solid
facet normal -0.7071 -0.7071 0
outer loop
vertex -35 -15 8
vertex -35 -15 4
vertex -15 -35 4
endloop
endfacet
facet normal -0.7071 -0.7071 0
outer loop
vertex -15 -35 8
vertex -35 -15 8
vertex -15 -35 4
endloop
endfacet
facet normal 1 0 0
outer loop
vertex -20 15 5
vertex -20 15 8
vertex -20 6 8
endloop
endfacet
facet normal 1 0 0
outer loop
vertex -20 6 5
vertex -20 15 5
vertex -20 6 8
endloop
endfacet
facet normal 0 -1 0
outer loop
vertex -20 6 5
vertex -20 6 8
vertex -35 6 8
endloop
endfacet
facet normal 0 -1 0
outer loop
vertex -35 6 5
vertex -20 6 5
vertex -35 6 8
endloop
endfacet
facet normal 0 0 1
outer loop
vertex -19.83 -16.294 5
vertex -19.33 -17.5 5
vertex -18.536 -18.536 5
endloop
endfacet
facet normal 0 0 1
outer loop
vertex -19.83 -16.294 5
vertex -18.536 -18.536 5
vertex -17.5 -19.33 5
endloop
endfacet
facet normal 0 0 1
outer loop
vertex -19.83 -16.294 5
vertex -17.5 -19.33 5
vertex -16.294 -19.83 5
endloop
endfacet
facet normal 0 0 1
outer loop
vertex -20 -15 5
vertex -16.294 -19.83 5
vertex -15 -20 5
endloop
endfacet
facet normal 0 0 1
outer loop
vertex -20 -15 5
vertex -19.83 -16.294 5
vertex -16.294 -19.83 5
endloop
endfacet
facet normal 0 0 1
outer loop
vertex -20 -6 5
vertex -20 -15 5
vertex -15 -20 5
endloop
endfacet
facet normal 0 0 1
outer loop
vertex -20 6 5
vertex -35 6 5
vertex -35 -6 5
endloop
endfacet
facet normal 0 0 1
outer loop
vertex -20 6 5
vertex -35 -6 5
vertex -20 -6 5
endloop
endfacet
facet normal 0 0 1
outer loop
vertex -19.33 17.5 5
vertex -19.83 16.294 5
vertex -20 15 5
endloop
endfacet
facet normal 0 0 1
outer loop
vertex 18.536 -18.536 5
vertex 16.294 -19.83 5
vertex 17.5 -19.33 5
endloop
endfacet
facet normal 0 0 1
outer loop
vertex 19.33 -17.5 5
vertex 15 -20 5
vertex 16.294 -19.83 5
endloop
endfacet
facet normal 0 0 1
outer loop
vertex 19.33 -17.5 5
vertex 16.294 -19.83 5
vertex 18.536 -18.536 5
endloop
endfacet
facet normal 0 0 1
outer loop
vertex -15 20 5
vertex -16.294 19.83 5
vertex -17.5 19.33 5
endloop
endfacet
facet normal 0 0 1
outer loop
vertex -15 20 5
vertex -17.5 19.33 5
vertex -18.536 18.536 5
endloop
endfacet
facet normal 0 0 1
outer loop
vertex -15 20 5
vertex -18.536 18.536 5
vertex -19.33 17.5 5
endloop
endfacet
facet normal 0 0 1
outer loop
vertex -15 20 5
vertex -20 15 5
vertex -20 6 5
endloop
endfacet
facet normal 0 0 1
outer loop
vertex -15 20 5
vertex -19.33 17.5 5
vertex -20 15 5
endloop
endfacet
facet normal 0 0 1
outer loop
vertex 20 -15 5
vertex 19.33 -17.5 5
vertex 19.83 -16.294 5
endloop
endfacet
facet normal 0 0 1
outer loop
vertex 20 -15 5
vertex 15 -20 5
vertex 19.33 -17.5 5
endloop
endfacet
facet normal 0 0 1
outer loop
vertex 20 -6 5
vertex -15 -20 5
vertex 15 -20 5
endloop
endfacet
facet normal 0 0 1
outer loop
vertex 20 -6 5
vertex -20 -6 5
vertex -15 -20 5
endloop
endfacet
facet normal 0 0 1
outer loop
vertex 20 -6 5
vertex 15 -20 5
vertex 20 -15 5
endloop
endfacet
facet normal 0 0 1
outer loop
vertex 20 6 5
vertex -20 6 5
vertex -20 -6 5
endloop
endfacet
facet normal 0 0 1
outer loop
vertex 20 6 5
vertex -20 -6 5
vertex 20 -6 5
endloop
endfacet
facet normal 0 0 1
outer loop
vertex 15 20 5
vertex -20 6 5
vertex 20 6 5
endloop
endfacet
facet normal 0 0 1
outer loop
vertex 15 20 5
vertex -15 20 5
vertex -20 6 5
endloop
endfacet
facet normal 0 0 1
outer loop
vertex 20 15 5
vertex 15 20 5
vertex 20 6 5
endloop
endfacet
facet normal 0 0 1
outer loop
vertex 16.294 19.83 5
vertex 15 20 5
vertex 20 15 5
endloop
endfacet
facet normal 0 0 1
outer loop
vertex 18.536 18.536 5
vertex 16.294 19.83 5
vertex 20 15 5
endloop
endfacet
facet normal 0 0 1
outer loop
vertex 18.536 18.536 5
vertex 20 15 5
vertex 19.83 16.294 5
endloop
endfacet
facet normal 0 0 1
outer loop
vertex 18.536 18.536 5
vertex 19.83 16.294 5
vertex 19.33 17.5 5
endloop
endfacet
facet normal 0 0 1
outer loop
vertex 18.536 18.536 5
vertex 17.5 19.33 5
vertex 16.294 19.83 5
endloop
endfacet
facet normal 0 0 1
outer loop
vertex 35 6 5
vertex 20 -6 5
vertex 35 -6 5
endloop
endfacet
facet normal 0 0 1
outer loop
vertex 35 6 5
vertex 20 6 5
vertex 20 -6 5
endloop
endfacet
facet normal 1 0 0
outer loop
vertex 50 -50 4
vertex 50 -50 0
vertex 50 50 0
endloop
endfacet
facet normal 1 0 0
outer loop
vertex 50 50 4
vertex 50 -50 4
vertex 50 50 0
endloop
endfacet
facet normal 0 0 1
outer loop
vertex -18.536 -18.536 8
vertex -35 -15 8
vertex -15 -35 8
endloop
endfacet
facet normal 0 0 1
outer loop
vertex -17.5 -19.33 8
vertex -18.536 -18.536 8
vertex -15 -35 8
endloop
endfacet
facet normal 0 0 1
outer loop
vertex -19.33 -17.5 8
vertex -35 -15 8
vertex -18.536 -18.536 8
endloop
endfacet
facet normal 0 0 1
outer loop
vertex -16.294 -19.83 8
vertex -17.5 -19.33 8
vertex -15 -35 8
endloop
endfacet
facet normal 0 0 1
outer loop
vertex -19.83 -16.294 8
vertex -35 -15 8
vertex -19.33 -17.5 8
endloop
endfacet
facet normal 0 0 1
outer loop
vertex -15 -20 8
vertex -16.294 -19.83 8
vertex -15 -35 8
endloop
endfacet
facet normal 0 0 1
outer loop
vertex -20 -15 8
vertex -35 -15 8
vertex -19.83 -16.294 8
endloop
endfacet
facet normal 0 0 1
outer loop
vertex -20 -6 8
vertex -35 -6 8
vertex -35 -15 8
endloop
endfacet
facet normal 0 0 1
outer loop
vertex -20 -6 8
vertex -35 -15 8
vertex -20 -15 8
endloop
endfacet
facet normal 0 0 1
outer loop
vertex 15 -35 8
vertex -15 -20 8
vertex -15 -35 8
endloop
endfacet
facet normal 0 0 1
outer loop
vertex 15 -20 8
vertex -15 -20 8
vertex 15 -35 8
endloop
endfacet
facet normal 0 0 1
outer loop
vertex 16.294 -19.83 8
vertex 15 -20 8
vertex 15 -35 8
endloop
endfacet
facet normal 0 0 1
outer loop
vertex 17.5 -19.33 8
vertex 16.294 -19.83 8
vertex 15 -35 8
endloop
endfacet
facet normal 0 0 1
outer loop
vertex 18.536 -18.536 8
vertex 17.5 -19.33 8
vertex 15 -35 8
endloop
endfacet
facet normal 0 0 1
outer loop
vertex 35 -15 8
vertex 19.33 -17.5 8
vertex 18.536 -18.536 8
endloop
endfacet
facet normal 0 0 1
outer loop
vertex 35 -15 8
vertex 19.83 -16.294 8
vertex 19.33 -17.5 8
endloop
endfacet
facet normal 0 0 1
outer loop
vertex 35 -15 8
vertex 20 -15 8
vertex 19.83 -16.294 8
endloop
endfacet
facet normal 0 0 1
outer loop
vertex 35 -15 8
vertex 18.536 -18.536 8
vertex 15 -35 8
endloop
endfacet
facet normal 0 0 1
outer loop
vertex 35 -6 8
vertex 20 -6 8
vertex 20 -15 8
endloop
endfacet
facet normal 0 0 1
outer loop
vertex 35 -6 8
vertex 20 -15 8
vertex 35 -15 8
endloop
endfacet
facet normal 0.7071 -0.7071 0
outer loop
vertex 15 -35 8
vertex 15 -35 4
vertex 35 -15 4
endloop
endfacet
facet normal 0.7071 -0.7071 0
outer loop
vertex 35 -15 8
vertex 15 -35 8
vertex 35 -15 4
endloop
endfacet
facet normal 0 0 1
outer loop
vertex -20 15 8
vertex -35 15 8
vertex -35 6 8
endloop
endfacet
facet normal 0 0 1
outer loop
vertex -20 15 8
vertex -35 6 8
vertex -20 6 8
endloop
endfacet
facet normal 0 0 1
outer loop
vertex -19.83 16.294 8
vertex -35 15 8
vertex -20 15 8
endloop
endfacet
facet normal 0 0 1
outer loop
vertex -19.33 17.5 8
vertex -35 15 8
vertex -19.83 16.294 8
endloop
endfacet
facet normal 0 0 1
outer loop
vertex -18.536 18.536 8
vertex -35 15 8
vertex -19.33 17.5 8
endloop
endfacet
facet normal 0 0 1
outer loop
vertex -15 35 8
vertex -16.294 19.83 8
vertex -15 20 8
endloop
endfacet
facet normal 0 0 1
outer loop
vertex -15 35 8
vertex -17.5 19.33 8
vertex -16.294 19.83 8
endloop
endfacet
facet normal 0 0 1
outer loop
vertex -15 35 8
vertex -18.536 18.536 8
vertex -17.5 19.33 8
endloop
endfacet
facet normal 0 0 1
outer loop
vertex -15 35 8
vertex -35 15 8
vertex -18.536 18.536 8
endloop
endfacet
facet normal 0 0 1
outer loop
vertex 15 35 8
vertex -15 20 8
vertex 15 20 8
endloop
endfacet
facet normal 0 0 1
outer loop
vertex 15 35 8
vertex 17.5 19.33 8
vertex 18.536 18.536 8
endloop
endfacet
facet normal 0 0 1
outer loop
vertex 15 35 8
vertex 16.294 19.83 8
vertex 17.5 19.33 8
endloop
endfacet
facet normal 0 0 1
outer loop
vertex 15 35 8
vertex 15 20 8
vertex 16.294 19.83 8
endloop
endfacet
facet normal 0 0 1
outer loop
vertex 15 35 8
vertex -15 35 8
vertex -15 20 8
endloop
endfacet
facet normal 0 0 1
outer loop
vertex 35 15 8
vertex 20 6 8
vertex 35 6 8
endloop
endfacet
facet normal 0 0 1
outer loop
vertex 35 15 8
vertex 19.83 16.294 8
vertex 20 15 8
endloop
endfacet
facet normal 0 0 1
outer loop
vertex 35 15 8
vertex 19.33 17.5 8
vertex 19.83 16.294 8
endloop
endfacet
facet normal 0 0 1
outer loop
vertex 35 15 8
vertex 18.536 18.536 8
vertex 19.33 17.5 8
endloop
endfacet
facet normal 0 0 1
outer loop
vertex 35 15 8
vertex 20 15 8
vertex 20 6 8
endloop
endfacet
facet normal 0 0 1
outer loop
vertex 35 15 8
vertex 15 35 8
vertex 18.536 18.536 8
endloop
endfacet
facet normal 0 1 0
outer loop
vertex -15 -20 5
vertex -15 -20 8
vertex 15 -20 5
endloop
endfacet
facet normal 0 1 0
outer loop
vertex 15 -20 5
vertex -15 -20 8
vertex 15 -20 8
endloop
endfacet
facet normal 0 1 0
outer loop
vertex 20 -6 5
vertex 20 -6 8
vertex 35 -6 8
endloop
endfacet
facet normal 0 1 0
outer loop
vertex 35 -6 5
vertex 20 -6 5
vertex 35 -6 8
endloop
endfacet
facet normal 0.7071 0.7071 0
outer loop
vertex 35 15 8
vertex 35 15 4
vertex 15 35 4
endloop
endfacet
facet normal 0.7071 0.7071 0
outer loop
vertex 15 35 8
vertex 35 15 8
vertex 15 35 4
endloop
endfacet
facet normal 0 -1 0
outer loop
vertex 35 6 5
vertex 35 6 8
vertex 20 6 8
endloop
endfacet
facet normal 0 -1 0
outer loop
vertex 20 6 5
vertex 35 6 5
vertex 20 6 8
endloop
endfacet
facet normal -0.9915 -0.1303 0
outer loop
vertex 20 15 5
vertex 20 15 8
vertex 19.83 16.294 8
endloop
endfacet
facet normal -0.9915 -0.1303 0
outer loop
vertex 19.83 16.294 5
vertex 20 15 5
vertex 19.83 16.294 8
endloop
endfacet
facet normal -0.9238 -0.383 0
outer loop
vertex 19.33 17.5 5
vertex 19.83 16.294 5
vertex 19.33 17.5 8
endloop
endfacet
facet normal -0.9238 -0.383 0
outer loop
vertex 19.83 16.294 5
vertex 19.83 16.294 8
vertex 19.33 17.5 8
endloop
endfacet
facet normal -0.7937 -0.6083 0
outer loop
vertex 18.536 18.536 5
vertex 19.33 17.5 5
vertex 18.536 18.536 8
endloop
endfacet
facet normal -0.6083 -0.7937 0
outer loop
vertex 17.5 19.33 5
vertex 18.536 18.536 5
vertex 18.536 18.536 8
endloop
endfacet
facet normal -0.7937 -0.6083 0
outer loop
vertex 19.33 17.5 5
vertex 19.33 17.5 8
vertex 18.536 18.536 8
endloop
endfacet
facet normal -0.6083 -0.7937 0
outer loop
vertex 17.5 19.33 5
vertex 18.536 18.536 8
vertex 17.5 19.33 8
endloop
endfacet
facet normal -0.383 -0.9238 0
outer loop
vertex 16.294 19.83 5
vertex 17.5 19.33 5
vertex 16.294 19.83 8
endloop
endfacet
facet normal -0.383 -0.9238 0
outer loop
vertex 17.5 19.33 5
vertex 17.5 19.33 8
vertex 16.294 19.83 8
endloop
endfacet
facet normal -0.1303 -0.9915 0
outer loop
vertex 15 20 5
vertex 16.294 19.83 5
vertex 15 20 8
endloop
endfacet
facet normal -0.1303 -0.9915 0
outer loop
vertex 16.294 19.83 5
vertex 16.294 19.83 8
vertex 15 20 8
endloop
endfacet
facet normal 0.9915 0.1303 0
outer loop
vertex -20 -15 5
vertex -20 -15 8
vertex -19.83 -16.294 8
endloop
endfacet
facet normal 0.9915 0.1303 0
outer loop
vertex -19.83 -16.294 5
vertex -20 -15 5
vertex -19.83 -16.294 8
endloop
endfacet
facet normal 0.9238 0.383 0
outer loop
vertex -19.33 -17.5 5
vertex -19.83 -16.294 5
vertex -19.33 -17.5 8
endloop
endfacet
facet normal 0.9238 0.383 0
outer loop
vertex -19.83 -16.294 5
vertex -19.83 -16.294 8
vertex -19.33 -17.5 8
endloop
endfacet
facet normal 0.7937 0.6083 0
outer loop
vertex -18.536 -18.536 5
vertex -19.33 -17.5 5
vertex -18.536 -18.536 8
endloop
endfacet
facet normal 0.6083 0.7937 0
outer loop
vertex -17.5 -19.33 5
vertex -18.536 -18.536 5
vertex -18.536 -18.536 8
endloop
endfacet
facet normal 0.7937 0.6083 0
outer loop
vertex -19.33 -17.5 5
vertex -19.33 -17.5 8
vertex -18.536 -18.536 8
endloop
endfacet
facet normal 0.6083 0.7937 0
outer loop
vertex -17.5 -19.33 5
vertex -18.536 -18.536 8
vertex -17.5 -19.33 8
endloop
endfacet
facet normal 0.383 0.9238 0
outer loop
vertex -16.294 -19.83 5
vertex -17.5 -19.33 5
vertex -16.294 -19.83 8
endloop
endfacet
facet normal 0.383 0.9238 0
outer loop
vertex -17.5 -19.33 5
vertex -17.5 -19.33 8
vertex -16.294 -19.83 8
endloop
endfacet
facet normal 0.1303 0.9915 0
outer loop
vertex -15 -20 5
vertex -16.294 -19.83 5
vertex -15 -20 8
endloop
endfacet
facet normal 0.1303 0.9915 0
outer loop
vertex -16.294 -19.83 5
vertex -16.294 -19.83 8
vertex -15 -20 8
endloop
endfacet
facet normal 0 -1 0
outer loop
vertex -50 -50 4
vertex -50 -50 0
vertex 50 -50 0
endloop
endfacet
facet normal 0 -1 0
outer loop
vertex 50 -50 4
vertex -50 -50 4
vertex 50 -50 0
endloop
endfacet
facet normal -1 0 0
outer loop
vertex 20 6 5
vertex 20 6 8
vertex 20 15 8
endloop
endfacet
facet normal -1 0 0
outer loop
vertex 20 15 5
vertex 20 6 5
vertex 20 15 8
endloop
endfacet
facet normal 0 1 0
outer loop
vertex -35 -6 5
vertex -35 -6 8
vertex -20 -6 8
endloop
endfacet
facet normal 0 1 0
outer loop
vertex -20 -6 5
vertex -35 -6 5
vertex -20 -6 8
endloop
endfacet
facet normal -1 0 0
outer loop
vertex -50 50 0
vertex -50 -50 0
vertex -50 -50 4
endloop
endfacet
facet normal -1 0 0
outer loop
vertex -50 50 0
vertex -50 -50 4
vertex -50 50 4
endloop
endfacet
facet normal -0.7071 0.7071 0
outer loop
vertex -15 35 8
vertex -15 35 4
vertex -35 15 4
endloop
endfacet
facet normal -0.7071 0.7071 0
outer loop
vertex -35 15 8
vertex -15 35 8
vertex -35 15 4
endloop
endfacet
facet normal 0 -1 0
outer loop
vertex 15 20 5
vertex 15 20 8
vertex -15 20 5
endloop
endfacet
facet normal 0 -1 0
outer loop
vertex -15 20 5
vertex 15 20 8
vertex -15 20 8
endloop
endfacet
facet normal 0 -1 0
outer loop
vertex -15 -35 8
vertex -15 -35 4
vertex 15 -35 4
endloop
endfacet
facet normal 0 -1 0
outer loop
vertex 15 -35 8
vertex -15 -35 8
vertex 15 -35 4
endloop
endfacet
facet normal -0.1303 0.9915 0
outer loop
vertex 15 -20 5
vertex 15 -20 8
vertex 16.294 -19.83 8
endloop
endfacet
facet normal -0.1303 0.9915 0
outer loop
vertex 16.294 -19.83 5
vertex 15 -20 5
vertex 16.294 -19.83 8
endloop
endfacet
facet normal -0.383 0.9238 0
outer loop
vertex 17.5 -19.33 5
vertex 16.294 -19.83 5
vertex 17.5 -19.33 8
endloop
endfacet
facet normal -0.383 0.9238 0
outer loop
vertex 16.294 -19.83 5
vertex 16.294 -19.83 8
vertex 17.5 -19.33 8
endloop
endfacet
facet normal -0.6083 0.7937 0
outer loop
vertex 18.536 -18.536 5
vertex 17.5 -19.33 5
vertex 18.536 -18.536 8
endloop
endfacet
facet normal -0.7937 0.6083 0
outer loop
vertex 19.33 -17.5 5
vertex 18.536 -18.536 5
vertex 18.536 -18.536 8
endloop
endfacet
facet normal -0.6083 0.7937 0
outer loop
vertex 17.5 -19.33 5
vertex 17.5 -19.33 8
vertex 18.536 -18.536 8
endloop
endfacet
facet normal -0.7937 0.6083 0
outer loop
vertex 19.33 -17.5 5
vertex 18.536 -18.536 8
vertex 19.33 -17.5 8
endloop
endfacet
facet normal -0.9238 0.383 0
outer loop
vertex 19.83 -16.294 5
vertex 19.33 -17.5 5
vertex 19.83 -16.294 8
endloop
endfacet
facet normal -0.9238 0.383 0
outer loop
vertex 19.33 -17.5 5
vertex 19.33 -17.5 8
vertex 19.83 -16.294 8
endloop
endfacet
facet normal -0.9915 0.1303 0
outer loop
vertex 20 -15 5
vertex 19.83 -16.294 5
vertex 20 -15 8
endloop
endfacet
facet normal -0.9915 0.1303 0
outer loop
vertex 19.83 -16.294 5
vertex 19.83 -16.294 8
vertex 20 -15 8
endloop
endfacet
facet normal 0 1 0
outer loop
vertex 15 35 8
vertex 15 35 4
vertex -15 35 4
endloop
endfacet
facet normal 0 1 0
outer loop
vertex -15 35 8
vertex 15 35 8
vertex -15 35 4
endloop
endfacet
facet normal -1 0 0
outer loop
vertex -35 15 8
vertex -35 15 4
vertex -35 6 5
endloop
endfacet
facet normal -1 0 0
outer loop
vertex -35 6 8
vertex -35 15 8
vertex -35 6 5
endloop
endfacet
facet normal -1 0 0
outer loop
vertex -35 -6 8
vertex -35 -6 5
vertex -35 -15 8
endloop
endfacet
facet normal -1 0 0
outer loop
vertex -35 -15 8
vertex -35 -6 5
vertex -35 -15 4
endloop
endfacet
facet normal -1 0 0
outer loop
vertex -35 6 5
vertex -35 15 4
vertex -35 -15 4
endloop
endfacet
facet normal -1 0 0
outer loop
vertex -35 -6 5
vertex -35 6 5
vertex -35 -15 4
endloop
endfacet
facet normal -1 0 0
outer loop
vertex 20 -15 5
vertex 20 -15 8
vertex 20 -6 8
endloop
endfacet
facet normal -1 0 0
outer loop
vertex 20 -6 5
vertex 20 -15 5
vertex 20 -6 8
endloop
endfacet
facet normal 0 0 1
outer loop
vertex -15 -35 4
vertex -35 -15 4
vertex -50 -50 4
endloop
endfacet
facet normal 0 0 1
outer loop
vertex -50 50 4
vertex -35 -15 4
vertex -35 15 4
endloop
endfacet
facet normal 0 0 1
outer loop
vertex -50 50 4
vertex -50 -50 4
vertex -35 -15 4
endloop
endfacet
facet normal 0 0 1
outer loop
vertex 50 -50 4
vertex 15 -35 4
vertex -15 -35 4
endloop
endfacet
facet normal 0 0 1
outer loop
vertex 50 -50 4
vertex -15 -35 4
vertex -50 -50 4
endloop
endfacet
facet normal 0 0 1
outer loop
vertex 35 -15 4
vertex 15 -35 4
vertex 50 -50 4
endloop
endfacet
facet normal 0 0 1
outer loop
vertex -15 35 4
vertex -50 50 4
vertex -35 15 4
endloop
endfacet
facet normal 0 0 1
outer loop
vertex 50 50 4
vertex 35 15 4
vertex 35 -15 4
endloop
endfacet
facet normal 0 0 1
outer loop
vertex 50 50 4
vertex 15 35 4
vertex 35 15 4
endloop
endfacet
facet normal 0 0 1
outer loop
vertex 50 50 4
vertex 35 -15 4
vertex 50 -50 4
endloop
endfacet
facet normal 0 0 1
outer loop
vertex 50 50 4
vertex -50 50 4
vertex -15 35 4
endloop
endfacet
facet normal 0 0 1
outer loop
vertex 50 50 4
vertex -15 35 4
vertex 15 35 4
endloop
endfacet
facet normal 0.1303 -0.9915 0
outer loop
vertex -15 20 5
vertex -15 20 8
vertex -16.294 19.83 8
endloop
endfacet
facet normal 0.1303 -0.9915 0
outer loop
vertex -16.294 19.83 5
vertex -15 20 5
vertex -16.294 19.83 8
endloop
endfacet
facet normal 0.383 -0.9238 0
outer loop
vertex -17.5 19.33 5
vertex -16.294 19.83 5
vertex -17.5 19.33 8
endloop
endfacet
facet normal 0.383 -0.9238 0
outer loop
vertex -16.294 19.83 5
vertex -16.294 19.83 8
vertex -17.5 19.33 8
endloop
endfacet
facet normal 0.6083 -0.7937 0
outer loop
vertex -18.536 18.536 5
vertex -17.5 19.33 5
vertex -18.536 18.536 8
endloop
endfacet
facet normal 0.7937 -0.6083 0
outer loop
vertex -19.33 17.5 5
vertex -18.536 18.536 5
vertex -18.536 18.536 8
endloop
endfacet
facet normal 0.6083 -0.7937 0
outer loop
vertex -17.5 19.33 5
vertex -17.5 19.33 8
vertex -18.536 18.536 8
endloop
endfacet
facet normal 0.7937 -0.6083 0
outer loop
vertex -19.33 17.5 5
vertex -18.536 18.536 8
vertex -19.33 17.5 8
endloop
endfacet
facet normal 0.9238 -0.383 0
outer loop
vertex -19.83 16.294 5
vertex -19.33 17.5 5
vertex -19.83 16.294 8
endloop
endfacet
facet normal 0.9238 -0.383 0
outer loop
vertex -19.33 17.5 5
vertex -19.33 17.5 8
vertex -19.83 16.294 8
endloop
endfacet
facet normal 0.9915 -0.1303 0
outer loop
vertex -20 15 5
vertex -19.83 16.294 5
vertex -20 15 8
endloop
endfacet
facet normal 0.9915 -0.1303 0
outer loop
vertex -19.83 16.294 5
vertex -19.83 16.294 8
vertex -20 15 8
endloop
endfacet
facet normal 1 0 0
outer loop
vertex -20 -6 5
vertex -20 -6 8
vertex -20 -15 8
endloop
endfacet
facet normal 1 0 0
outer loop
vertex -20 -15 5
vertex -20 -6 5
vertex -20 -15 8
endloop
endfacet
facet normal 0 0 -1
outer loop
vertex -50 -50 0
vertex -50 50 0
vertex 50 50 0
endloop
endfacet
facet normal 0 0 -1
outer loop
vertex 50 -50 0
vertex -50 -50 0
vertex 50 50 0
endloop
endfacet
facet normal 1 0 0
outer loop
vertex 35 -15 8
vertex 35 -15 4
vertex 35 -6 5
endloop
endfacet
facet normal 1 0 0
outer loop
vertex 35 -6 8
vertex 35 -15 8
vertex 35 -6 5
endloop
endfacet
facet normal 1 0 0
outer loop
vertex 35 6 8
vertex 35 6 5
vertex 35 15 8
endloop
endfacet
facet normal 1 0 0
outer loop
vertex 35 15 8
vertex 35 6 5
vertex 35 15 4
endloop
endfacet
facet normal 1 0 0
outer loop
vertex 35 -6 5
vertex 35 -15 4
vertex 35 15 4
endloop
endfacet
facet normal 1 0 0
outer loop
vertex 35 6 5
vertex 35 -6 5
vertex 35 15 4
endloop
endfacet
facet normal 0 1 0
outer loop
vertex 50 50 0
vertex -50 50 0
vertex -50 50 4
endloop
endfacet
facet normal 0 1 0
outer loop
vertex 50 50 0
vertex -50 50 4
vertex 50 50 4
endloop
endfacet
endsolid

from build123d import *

# Parameters (mm, degrees)
F0_W     = 100
F0_H     = 100
F1_DEPTH = 4
F3_DEPTH = 4
F5_DEPTH = 3


with BuildPart() as f1:
    # F0 (on Top) → F1 (new body)
    with BuildSketch(Plane.XY):
        Rectangle(F0_W, F0_H)
    extrude(amount=F1_DEPTH)

    # F2 (on face) → F3 (join)
    with BuildSketch(Plane.XY.offset(4)):
        Polygon((35, -15), (35, 15), (15, 35), (0, 35), (-15, 35), (-35, 15), (-35, -15), (-15, -35), (0, -35), (15, -35), align=None)
    extrude(amount=F3_DEPTH)

    # F4 (on face) → F5 (cut)
    with BuildSketch(Plane.XY.offset(8)):
        with BuildLine():
            Line((15, 20), (-15, 20))
            ThreePointArc((-15, 20), (-18.535534, 18.535534), (-20, 15))
            Line((-20, 15), (-20, 6))
            Line((-20, 6), (-35, 6))
            Line((-35, 6), (-35, -6))
            Line((-35, -6), (-20, -6))
            Line((-20, -6), (-20, -15))
            ThreePointArc((-20, -15), (-18.535534, -18.535534), (-15, -20))
            Line((-15, -20), (15, -20))
            ThreePointArc((15, -20), (18.535534, -18.535534), (20, -15))
            Line((20, -15), (20, -6))
            Line((20, -6), (35, -6))
            Line((35, -6), (35, 6))
            Line((35, 6), (20, 6))
            Line((20, 6), (20, 15))
            ThreePointArc((20, 15), (18.535534, 18.535534), (15, 20))
        make_face()
    extrude(amount=-F5_DEPTH, mode=Mode.SUBTRACT)


solid = f1.part
